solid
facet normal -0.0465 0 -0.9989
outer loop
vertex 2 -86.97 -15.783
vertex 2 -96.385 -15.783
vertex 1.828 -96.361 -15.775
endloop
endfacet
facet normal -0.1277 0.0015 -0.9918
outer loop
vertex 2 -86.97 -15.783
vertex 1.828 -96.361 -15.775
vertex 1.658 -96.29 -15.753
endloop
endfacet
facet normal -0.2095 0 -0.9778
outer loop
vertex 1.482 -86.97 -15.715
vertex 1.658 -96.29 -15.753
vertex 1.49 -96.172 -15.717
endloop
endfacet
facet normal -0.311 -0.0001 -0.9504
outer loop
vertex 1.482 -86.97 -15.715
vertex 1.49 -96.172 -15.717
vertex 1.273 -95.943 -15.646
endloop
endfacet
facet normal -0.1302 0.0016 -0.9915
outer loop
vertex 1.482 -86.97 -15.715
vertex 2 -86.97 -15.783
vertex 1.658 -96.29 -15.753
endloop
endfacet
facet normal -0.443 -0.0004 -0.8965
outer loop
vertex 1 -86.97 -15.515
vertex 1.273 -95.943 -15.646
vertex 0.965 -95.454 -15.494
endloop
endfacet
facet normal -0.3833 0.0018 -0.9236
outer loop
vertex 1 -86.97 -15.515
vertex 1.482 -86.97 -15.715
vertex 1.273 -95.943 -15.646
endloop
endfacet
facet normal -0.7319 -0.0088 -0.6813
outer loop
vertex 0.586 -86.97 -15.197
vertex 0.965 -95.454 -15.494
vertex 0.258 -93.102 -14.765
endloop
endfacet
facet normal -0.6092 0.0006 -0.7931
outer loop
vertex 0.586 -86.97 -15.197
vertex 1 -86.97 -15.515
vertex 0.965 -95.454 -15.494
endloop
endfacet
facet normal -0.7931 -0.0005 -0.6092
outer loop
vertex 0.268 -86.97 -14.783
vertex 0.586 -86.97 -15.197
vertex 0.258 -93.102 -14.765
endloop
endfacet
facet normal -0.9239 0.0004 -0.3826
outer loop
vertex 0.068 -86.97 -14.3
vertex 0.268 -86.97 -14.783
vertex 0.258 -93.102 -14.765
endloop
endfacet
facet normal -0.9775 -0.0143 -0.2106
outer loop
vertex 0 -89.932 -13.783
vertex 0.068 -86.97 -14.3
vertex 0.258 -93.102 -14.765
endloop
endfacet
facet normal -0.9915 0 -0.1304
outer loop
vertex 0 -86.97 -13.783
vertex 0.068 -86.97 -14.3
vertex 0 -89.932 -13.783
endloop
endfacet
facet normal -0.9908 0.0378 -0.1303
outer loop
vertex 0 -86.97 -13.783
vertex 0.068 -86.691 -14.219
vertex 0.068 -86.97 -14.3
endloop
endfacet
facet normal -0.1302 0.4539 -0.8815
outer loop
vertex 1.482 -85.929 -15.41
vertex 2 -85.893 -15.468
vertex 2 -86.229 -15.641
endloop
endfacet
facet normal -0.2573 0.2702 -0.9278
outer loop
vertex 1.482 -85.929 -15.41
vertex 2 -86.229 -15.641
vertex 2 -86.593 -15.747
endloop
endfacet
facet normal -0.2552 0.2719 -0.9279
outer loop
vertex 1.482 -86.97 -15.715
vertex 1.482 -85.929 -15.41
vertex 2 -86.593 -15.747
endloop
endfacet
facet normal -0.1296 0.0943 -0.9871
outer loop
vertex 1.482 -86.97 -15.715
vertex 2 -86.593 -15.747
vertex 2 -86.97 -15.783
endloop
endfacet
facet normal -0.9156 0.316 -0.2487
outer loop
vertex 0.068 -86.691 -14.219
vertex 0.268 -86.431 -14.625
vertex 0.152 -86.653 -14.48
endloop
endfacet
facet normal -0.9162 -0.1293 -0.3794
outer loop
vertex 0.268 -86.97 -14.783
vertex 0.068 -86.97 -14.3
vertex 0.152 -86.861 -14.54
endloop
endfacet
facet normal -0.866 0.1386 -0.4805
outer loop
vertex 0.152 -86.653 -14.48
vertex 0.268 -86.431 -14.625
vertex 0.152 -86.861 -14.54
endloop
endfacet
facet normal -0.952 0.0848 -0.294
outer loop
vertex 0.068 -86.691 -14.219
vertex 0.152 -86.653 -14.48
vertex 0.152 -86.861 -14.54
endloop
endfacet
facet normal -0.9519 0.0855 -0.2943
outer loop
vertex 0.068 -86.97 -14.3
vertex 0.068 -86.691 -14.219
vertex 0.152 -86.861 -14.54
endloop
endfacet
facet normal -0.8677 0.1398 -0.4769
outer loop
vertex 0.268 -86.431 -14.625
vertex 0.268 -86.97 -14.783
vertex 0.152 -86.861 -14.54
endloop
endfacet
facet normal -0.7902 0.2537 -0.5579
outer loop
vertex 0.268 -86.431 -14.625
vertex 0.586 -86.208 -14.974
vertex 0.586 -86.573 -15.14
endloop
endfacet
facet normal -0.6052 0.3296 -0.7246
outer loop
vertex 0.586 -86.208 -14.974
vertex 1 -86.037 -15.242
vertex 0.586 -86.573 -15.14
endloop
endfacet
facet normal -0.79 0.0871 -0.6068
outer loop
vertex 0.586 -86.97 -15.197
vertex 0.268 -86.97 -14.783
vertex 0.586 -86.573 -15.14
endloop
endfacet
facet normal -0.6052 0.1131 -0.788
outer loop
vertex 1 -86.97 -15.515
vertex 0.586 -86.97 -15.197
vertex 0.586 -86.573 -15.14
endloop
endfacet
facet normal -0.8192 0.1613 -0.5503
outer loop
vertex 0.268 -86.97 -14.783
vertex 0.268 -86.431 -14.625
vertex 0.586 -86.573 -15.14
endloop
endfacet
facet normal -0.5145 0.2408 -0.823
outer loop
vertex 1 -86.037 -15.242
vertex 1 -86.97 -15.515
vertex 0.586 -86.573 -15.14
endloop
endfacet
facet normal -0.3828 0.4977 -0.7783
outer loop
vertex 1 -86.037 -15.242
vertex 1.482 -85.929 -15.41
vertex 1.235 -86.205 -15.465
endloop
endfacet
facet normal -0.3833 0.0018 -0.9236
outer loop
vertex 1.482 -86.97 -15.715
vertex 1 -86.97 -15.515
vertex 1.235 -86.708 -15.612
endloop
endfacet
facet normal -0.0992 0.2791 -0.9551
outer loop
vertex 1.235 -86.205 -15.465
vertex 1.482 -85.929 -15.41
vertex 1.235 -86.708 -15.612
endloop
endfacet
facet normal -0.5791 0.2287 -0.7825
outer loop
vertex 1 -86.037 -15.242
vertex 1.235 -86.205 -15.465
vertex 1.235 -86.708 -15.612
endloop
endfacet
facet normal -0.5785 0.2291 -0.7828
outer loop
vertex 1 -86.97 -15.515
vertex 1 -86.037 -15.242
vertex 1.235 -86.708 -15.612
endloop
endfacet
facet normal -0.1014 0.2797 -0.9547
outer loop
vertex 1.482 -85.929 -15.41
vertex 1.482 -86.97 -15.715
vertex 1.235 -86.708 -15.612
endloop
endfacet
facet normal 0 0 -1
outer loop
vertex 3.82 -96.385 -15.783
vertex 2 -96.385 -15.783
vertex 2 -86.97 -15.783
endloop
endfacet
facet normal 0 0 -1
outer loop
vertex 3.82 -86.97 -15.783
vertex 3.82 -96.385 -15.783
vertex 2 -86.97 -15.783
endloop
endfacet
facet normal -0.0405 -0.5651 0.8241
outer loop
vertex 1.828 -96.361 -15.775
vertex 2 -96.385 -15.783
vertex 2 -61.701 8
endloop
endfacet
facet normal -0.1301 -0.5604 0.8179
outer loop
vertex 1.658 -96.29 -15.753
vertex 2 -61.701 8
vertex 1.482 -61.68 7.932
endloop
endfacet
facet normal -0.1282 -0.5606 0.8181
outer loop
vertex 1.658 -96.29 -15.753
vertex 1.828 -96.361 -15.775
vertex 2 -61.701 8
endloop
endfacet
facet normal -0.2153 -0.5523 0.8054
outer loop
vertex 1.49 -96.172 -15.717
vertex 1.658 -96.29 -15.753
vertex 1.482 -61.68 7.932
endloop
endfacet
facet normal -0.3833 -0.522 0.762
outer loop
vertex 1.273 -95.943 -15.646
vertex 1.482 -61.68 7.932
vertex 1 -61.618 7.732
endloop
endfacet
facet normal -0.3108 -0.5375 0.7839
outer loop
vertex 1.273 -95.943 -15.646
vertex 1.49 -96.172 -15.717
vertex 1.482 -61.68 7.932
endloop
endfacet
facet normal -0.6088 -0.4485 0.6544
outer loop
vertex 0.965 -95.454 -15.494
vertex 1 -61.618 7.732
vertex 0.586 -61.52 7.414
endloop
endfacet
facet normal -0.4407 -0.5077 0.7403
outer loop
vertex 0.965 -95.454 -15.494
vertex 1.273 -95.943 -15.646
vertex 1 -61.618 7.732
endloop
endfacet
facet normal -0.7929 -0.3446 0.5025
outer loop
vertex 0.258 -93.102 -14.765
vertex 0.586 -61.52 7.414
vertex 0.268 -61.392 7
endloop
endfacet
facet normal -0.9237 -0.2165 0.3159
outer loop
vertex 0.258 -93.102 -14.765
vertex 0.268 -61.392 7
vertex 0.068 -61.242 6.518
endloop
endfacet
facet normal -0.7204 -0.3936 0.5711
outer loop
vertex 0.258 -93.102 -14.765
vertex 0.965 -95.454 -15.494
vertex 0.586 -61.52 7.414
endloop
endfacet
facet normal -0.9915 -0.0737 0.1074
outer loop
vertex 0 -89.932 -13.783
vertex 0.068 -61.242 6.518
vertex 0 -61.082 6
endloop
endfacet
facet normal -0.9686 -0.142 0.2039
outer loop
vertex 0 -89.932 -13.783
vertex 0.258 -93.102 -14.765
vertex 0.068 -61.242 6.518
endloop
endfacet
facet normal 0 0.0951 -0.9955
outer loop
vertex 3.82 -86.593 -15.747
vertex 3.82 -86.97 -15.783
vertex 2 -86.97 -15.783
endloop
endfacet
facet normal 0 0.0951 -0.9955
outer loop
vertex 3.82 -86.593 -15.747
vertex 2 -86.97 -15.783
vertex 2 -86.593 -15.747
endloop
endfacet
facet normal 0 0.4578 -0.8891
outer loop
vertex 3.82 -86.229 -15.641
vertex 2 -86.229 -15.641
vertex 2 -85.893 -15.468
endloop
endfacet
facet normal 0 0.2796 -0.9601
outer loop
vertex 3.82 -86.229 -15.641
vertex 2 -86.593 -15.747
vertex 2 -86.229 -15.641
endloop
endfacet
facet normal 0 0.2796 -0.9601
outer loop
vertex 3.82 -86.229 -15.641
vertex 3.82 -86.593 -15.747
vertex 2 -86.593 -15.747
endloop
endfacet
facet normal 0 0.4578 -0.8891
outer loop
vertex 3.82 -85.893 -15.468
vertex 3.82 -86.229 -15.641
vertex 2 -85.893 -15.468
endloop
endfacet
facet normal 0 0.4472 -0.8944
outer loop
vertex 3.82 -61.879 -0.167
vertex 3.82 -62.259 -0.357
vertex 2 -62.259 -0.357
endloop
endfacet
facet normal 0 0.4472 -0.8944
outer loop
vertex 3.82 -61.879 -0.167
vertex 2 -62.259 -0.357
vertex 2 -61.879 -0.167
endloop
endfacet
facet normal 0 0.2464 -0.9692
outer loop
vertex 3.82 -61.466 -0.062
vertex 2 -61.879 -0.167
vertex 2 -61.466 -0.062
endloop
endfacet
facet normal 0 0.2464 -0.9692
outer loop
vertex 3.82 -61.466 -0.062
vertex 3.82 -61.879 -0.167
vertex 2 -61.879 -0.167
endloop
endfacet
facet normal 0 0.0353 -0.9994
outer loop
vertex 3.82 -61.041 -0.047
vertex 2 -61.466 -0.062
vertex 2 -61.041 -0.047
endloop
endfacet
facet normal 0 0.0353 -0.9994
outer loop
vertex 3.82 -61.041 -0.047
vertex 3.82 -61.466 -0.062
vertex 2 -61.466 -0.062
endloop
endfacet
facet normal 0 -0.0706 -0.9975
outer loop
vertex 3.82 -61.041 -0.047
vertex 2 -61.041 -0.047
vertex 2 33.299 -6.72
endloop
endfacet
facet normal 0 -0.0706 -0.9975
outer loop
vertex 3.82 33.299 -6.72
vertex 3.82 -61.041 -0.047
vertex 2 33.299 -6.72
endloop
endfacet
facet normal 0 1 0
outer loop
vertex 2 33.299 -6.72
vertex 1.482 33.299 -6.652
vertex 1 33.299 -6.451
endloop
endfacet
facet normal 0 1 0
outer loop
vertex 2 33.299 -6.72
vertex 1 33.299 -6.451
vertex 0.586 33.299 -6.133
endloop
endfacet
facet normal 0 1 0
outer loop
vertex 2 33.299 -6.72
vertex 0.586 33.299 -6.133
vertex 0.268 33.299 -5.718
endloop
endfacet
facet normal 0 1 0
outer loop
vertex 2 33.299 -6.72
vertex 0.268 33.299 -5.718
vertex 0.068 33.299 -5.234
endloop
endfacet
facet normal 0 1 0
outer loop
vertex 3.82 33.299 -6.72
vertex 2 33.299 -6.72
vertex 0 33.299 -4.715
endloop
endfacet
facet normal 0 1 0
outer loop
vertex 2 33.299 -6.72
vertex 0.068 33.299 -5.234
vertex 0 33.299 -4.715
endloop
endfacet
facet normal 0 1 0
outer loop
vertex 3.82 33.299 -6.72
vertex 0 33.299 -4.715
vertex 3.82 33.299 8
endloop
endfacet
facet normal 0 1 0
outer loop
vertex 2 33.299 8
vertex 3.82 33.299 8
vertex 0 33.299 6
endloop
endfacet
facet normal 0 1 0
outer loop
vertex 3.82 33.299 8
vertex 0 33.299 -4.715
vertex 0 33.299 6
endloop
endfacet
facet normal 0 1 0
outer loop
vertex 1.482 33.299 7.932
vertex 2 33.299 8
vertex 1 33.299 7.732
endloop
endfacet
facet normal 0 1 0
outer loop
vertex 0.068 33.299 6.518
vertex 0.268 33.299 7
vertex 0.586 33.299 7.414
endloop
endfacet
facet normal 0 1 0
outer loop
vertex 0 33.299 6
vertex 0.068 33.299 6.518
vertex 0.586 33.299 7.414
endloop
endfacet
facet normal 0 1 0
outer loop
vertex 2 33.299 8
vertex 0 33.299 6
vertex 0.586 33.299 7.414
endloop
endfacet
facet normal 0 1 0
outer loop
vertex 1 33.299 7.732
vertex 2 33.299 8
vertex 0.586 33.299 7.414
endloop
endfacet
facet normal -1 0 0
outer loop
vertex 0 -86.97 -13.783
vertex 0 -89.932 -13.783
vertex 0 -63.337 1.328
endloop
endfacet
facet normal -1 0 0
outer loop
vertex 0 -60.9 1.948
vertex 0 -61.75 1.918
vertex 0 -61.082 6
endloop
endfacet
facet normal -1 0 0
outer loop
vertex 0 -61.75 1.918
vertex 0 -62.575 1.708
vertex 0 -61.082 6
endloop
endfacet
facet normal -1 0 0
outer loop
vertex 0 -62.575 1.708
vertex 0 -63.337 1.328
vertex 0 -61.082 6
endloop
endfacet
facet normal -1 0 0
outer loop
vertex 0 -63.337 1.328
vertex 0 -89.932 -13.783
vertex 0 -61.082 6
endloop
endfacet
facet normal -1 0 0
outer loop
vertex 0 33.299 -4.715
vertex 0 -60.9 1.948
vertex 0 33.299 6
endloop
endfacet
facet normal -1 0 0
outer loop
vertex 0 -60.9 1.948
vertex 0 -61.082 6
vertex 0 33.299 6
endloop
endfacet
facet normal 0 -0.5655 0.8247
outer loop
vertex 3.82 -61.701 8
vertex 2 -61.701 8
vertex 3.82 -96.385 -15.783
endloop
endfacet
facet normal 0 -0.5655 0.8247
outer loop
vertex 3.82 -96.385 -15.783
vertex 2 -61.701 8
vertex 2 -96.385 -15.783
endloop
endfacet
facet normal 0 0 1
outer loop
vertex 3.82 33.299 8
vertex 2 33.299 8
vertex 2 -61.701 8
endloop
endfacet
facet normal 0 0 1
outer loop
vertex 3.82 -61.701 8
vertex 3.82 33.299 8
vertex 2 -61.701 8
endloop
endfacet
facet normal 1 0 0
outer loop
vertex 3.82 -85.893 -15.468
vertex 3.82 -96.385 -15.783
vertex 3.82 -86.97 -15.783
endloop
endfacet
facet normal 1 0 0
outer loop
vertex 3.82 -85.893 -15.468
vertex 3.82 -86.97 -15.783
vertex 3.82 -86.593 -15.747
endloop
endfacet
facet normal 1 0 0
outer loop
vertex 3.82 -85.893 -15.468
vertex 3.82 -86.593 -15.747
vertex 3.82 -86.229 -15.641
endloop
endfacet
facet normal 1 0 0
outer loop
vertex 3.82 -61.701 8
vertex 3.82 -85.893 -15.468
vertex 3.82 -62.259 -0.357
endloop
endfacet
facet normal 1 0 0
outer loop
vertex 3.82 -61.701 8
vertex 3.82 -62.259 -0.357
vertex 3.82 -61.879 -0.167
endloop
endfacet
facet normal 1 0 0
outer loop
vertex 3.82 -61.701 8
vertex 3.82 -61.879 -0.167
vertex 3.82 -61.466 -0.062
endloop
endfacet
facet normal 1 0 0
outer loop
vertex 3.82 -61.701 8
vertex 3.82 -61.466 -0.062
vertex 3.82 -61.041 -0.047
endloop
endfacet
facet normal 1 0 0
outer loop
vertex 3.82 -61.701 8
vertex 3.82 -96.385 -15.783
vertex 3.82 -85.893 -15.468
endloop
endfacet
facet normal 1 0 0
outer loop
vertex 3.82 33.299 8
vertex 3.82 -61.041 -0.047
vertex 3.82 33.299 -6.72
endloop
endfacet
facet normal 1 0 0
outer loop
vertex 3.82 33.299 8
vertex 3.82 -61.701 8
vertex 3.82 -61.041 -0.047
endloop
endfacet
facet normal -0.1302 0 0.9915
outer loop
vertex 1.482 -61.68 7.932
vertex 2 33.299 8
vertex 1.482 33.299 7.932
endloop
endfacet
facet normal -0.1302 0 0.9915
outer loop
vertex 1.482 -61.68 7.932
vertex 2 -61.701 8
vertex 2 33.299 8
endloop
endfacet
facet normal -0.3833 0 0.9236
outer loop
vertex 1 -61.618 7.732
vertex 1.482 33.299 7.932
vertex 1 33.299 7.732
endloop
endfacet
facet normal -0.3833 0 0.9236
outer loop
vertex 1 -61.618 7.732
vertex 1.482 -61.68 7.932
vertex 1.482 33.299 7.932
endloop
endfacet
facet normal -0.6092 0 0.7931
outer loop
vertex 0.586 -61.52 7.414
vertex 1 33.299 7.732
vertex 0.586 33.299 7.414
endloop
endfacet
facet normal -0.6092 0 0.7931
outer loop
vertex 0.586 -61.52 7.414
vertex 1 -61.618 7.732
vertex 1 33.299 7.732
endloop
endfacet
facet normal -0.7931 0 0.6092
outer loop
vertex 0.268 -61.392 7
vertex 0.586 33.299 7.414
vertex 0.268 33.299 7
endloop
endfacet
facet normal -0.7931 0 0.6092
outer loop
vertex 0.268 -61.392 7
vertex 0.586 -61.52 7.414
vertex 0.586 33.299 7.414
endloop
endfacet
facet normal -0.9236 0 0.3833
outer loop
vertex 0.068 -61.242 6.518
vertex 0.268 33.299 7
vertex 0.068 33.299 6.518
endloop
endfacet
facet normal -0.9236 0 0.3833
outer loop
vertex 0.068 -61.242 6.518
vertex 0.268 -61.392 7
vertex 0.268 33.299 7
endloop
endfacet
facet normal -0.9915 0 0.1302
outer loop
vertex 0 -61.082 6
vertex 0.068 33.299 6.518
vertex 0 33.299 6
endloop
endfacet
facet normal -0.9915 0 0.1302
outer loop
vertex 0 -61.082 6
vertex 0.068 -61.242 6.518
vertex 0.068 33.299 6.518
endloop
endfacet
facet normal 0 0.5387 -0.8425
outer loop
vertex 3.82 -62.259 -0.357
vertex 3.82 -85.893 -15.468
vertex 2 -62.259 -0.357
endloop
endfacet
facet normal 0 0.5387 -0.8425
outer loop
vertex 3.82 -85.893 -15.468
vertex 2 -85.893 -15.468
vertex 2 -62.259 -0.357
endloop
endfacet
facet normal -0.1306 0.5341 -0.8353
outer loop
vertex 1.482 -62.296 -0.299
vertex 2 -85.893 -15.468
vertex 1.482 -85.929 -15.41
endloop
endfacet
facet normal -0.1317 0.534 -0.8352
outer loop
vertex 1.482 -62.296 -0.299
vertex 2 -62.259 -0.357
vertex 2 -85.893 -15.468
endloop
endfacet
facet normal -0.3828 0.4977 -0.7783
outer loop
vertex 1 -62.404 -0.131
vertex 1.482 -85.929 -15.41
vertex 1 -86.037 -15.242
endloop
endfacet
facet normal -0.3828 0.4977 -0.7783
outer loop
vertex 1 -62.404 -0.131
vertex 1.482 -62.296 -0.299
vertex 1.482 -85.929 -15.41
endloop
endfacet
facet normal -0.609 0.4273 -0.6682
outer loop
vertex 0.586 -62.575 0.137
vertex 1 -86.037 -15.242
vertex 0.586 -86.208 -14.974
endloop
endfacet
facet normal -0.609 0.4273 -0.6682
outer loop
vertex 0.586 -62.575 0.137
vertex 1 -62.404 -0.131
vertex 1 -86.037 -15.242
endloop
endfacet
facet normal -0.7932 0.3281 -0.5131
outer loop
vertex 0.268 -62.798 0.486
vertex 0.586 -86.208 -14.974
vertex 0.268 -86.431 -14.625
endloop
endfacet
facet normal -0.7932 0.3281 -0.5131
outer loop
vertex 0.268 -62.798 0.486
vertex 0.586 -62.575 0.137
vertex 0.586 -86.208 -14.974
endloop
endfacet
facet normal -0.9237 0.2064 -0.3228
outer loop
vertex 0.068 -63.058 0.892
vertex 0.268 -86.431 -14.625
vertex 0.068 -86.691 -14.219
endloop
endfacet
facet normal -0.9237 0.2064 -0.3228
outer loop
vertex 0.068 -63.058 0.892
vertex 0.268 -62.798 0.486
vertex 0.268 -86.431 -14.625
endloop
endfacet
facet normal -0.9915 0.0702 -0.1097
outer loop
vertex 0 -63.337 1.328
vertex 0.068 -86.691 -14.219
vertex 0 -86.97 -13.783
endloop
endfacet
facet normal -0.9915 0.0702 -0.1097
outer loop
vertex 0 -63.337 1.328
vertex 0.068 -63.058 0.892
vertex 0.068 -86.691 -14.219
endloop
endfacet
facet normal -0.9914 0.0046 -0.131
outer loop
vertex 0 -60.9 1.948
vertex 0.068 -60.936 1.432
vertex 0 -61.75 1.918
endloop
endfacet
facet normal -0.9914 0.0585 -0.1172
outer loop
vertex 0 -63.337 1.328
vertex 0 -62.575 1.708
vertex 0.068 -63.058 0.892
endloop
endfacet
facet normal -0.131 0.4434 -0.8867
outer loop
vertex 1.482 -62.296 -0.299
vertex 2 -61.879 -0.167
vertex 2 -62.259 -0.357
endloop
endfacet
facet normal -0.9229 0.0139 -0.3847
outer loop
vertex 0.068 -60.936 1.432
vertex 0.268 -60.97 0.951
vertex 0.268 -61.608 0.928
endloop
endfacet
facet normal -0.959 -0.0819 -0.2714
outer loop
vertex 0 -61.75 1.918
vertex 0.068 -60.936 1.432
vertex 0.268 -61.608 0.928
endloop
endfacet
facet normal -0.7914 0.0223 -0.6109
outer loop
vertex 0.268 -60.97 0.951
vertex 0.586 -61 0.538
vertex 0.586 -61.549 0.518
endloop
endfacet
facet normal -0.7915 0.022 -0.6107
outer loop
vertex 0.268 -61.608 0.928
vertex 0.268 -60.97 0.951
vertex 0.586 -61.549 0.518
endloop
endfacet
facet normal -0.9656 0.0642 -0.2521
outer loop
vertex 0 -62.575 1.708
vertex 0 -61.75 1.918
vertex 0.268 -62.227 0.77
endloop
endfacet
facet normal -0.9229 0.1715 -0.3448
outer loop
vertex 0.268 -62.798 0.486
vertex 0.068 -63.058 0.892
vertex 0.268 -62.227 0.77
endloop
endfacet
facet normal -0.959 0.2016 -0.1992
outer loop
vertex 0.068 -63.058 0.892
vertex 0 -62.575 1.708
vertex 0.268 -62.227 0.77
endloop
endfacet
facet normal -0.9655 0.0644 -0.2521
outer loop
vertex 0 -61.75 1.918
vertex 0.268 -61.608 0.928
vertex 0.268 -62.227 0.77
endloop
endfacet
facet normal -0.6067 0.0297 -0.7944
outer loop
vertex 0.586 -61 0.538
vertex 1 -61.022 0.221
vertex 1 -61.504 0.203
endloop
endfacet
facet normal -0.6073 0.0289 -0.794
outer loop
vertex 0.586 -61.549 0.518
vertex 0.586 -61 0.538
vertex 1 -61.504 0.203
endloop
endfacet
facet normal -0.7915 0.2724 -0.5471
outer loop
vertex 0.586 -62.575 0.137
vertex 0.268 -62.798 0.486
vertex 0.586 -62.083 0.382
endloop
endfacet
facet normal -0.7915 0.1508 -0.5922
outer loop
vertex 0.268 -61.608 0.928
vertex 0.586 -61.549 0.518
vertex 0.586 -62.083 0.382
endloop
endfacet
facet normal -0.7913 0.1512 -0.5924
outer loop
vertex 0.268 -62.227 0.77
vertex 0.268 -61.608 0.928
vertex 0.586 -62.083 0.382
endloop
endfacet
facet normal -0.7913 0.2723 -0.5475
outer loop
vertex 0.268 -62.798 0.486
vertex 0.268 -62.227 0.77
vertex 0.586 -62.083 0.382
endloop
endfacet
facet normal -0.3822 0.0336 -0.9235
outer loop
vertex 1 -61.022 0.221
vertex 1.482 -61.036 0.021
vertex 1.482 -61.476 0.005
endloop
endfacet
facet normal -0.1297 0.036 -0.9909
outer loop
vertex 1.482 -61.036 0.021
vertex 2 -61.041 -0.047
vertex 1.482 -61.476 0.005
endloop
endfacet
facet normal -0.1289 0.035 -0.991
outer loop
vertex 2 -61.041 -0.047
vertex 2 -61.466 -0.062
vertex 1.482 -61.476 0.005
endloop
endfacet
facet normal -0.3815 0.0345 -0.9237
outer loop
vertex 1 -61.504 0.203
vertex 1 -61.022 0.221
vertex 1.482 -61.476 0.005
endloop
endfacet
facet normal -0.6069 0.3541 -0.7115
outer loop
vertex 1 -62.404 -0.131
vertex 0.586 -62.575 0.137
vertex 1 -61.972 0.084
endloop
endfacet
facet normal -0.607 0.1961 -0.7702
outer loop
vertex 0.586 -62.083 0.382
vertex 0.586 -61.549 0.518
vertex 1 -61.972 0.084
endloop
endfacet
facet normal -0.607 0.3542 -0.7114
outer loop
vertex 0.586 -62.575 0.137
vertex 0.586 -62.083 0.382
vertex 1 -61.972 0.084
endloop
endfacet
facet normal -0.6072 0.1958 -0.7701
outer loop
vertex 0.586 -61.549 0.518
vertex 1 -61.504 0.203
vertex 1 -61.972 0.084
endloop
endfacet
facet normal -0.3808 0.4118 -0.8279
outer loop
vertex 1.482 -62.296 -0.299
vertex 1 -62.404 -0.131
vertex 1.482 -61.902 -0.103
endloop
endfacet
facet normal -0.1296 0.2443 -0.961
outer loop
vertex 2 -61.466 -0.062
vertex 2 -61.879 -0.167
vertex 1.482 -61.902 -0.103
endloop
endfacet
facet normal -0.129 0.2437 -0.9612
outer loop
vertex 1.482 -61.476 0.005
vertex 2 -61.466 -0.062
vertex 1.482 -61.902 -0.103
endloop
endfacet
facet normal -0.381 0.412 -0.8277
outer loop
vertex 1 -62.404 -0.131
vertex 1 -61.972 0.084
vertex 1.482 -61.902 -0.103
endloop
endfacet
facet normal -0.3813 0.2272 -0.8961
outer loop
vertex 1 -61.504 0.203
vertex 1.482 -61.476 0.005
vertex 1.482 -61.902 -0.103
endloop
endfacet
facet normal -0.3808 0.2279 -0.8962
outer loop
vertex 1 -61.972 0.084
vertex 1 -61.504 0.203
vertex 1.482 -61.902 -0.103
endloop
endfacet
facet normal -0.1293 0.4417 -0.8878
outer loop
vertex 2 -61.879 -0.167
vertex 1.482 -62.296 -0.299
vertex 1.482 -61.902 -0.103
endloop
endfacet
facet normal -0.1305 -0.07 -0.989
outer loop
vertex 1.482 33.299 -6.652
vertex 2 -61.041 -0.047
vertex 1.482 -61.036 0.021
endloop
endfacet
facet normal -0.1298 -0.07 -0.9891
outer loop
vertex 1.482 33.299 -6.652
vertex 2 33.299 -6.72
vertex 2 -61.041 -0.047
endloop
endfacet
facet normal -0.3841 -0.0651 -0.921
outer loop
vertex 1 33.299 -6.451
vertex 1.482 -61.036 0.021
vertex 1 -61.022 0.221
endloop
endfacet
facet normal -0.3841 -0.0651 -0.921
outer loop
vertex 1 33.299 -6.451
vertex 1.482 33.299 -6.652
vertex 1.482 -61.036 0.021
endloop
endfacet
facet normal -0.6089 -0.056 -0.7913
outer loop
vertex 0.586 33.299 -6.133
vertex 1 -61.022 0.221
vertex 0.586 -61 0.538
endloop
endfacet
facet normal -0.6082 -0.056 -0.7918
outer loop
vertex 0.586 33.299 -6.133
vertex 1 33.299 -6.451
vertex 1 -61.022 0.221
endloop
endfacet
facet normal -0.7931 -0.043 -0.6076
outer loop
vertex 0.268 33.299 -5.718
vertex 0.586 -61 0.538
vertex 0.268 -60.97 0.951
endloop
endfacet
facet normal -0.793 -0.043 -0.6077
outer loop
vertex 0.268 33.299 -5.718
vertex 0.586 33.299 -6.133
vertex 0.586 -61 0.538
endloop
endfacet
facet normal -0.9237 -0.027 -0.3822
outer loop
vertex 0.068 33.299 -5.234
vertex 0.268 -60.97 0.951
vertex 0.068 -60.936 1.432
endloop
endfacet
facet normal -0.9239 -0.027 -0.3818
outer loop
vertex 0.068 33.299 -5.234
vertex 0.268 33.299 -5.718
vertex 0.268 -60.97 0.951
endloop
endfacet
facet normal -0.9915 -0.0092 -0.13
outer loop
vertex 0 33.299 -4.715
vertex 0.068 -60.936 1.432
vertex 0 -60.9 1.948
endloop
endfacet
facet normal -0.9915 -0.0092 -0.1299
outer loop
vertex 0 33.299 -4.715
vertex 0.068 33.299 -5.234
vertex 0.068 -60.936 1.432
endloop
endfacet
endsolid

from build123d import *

# Parameters (mm, degrees)
F1_DEPTH = 3.82
F2_R     = 2


with BuildPart() as f1:
    # F0 (on Right) → F1 (new body)
    with BuildSketch(Plane.YZ):
        Polygon((33.298553, -6.72), (33.298553, 8), (-61.701447, 8), (-96.385158, -15.782844), (-86.385158, -15.782844), (-61.701447, 0), align=None)
    extrude(amount=F1_DEPTH)

    # F2
    f2_edges = [f1.edges().sort_by_distance(p)[0] for p in [
        (0, -14.201447, 8),
        (0, -14.201447, -3.36),
        (0, -79.043303, -3.891422),
        (0, -74.043303, -7.891422),
        (0, -91.385158, -15.782844),
        (1.91, -61.701447, 0),
        (1.91, -86.385158, -15.782844),
    ]]
    fillet(f2_edges, radius=F2_R)


solid = f1.part
